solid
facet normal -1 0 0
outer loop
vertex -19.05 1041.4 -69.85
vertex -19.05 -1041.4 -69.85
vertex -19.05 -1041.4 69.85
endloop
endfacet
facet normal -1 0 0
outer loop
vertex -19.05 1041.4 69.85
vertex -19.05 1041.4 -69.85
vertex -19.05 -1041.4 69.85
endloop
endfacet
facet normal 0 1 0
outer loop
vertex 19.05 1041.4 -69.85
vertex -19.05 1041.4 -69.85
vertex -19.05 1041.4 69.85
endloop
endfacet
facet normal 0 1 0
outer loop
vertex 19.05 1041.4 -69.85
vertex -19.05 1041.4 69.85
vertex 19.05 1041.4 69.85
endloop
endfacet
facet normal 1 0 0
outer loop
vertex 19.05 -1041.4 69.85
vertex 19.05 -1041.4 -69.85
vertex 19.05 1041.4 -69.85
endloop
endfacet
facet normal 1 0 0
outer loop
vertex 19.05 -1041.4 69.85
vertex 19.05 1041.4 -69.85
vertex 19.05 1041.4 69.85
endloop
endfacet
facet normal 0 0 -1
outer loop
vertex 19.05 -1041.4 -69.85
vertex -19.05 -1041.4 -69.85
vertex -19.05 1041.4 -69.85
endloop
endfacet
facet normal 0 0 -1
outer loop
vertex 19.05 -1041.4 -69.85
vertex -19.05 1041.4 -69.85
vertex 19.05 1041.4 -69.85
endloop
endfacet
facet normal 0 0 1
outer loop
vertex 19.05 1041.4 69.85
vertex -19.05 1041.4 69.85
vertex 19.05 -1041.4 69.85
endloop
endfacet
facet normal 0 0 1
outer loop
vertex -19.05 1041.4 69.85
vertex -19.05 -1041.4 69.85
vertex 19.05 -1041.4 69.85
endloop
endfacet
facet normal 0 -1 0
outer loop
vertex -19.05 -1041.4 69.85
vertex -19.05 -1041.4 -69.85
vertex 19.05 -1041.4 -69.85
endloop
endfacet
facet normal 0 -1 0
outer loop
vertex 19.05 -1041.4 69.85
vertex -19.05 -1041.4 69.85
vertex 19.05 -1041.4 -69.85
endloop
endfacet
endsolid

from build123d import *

# Parameters (mm, degrees)
F0_W     = 38.1
F0_H     = 139.7
F1_DEPTH = 1041.4


with BuildPart() as f1:
    # F0 (on Front) → F1 (new body, symmetric)
    with BuildSketch(Plane.XZ):
        Rectangle(F0_W, F0_H)
    extrude(amount=F1_DEPTH, both=True)


with BuildPart() as f2_1:
    # F2: copy of F1
    add(f1.part.moved(Location((127, 0, 0))))


solid = f1.part
